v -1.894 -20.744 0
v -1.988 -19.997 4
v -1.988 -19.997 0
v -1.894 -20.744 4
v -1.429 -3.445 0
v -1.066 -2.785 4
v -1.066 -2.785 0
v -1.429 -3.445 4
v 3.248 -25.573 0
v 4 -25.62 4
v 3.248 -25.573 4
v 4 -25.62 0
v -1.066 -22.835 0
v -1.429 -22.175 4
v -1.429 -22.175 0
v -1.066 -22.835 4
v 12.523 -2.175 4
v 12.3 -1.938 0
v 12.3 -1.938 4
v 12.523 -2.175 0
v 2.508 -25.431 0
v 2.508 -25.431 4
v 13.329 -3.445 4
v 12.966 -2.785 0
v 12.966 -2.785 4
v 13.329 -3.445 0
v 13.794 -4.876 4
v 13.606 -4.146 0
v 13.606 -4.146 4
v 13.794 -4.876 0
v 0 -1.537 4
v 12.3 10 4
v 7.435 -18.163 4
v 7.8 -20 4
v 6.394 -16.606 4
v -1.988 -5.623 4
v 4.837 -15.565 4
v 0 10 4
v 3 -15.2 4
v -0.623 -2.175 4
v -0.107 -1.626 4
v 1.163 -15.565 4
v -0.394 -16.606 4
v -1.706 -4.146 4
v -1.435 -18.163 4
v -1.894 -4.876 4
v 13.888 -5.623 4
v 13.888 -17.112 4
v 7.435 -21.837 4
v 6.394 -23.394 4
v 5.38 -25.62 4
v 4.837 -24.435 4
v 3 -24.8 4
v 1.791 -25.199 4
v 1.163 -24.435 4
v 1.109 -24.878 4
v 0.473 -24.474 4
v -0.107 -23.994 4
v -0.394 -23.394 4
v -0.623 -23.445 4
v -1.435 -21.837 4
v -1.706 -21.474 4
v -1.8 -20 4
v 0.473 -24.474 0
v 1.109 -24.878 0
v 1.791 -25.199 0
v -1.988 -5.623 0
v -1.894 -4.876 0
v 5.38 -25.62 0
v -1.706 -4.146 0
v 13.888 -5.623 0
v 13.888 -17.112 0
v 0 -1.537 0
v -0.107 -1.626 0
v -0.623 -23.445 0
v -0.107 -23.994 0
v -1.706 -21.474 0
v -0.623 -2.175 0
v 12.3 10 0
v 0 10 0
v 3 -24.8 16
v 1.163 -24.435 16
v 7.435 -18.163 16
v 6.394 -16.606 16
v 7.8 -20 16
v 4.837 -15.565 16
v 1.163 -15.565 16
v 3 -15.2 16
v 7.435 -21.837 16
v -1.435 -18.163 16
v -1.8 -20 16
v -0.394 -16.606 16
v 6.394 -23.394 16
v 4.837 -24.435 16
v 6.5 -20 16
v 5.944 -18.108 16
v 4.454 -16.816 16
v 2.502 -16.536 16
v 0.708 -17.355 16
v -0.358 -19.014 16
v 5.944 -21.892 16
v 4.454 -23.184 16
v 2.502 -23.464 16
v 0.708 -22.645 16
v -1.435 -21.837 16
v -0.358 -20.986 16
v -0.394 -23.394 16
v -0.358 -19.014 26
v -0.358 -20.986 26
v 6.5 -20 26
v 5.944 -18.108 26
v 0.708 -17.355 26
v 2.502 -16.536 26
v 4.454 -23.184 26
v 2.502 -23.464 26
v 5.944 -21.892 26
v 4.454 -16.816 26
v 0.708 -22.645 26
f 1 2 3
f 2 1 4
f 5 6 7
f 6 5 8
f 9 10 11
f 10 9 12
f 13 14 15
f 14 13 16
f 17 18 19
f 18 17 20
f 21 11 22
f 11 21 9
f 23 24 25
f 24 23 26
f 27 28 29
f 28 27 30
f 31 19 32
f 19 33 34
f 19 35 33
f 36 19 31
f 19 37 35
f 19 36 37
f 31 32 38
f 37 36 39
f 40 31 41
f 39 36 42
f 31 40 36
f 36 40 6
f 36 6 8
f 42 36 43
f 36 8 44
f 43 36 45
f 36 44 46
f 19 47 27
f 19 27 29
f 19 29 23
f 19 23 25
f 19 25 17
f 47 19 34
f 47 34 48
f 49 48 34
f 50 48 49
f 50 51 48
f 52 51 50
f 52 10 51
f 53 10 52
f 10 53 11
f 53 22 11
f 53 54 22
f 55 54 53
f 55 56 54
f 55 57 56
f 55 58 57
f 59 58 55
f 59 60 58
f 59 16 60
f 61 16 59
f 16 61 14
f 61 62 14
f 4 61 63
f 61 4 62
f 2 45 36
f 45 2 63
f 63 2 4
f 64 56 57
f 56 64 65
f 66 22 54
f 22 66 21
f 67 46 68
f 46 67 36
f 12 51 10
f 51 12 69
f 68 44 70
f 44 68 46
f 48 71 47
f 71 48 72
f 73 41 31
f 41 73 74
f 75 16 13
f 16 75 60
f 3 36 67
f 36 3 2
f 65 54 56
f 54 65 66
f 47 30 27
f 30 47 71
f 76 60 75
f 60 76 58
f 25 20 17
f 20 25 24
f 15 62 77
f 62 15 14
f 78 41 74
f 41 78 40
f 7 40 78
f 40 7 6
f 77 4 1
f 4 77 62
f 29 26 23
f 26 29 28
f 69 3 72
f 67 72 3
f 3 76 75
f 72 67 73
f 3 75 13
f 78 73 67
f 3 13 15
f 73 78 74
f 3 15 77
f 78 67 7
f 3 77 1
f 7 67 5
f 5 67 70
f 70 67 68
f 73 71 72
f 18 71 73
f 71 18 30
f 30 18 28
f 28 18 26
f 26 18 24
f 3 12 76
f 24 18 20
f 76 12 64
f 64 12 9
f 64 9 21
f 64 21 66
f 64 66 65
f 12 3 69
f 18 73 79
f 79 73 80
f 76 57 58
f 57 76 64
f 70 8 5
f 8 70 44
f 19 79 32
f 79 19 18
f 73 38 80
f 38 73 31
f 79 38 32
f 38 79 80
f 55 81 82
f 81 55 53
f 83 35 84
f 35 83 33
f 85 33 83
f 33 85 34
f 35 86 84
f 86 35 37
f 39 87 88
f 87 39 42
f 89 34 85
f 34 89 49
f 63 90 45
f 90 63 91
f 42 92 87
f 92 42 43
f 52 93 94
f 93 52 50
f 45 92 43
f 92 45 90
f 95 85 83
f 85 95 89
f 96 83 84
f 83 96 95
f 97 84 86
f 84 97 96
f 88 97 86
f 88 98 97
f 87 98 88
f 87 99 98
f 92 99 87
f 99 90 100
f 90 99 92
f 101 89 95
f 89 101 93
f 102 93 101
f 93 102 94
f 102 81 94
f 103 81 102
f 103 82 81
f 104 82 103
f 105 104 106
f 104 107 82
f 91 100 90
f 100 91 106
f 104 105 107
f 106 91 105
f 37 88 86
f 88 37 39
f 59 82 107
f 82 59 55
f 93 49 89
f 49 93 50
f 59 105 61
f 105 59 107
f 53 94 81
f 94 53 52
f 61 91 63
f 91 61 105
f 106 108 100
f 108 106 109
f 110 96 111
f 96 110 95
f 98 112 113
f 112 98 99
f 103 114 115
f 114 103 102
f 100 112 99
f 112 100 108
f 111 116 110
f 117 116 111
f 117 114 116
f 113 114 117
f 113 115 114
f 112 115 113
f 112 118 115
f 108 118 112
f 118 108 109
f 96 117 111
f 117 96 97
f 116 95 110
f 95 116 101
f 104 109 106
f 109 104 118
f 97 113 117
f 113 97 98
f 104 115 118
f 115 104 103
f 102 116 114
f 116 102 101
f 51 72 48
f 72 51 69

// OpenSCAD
// Whirlpool refrigerator GX5SHTXTB00 
// pantry drawer hinge pin replacement left side
//
//  I printed in PLA .4
//
//  This script is a mash up of stuff 
//  I found on Thingiverse
//
//  Round corners for Openscad - Tutorial
//  by WilliamAAdams, published	 Jun 15, 2011
//  https://www.thingiverse.com/thing:9347

use <MCAD/boxes.scad>;
difference() {
union(){
		translate([4,-6,0])
    rotate(-90)
		miniround([25.62,15.9,3],6);
    translate([0,-2,0])
	  cube([12.3,12,4]);
    translate([3,-20,4])
    cylinder(r=4.8,h=12);
    translate([3,-20,16])
    cylinder(r=3.5,h=10);
}
	  translate([3,-28,0])
		rotate(-45)
		cube([60,60,10]);
}


module miniround(size, radius)
{
$fn=50;
x = size[0]-radius*2;
y = size[1]-radius*2;

minkowski()
{
cube(size=[x,y,size[2]]);
cylinder(r=radius);
}
}

// end
